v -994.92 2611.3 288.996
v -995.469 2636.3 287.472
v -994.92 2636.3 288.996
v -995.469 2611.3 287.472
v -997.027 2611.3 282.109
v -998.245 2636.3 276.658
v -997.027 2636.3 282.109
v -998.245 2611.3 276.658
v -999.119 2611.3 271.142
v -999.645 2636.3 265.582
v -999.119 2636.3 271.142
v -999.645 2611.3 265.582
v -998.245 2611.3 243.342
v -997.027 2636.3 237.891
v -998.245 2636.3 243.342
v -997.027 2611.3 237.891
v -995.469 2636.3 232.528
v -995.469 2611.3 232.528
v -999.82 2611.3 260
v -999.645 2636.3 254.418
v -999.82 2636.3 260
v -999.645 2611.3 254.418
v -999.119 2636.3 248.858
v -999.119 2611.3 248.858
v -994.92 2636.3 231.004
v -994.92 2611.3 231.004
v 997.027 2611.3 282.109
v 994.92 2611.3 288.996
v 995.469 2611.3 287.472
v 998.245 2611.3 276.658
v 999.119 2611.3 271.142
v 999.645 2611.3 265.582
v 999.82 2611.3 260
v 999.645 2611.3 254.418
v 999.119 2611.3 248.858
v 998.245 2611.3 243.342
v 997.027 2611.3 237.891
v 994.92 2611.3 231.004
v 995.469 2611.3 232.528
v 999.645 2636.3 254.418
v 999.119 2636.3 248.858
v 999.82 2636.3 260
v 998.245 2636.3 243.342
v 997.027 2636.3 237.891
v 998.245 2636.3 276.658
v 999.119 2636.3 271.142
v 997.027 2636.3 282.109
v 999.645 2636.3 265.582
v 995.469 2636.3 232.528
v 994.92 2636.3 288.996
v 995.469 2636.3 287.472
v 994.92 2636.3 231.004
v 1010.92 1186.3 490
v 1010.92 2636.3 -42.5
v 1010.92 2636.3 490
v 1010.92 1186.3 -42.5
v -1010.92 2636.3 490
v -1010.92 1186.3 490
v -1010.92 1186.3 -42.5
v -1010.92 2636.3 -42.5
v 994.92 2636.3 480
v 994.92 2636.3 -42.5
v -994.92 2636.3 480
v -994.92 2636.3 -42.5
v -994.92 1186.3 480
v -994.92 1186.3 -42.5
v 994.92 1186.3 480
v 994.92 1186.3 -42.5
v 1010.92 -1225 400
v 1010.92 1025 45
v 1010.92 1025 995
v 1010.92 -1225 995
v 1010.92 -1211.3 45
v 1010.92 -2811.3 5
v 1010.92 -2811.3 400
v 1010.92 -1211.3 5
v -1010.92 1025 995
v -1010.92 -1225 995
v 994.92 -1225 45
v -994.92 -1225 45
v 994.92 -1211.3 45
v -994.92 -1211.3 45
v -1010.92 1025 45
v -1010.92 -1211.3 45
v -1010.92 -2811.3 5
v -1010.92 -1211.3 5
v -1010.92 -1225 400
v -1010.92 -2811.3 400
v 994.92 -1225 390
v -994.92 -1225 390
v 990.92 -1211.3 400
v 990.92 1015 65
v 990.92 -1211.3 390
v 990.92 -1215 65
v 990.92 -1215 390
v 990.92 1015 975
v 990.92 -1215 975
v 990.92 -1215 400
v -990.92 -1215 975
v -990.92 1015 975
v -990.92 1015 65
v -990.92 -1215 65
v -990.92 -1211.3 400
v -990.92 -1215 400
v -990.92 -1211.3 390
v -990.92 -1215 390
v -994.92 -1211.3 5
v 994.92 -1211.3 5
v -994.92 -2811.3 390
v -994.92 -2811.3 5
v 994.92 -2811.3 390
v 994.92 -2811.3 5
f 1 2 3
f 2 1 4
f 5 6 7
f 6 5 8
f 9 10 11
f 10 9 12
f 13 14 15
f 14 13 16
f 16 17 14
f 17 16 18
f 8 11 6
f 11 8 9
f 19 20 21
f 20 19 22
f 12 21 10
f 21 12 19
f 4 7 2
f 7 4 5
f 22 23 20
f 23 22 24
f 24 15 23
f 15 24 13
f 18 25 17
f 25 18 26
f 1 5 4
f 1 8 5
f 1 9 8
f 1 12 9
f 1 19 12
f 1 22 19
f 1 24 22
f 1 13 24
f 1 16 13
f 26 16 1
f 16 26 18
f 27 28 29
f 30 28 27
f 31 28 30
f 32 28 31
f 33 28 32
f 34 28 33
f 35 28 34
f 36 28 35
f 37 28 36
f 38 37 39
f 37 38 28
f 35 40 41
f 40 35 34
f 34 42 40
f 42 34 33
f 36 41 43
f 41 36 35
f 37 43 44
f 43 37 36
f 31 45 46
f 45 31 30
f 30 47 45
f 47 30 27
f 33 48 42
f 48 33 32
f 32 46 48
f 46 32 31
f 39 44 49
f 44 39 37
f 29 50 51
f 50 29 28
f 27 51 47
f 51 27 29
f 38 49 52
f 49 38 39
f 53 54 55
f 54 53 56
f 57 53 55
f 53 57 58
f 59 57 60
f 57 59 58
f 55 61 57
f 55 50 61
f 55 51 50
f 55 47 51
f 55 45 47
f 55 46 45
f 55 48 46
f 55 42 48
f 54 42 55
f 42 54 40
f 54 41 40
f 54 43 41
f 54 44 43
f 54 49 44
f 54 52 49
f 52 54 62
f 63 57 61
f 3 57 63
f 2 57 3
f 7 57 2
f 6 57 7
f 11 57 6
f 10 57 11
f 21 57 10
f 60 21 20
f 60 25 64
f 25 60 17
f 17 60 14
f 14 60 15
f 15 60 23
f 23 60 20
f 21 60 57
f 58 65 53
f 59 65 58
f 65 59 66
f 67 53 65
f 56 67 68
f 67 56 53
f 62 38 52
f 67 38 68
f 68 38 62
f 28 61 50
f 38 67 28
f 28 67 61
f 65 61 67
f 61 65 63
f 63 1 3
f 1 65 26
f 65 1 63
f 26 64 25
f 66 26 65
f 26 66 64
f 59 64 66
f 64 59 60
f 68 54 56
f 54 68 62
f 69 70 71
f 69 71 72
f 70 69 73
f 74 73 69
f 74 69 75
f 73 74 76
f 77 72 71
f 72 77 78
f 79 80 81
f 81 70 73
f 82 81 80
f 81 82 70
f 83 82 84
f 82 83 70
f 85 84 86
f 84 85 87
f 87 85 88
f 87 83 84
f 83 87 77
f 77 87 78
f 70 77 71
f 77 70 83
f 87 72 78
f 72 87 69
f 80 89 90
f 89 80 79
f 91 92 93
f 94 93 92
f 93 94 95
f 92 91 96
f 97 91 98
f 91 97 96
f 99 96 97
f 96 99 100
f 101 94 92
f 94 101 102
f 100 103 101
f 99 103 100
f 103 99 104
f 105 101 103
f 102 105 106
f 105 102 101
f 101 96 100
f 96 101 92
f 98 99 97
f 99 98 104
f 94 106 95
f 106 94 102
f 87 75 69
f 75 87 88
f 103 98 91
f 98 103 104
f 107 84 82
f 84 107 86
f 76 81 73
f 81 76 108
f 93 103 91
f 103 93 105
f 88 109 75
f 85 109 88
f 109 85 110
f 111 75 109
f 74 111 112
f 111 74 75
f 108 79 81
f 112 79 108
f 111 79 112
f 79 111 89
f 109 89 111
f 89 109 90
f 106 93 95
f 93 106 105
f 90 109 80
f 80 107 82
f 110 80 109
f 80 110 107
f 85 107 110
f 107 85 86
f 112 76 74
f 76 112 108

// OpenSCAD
// ====================================================================================
// REVOLUTIONARY TECHNOLOGY COMPANY & UNIVERSITY OF WASHINGTON DEPARTMENT OF PHYSICS
// Subsystem: impala_ss_4door_body.scad (2027 Impala 4-Door Sedan Stamping Mask)
// Core Application: 1967 B-Body Silhouette Mated to Modern Titanium Architecture
// COMPLIANCE GATE: Maintains absolute 65mm lower open clearance for underbody armor
// Center Origin (0,0,0) = Geometric Centerpoint of the 119-Inch Wheelbase Centerline
// ====================================================================================

$fn = 100; // Parametric panel contour surface finish path resolution

// --- 1967/2027 Impala SS 4-Door Dimensional Constants (mm) ---
inch_to_mm         = 25.4;
impala_wheelbase   = 119.0 * inch_to_mm; // Exactly 3022.60 mm classic tracking length
body_total_width   = 79.6 * inch_to_mm;  // 2021.84 mm wide muscle-car shoulder stance
sheet_metal_thick  = 1.50;               // Heavy fleet-gauge stamped steel skin scale

// Underbody Clearance Rule Compliance
UNDER_ARMOR_CLEARANCE_MM = 65.00;

module stamped_front_hood_and_fenders() {
    echo("STAMPING 2027 IMPALA SS 4-DOOR SEDAN EXTERIOR FLEET MASK");
    // Sweeping front nose clip clearing the 1,350 Nm Square-Tooth propulsion engine core
    color("ClassicTeal") {
        difference() {
            // Front clip exterior boundary envelope
            translate([0, impala_wheelbase/2 + 400, 180])
                cube([body_total_width, 1450, 620], center=true);
            
            // Hollow inner engine bay cavity clearing structural chassis rails
            translate([0, impala_wheelbase/2 + 400, 180])
                cube([body_total_width - 32, 1454, 600], center=true);
                
            // LOWER PROFILE STANDOFF: Cuts base line to leave open armor installation room
            translate([0, impala_wheelbase/2 + 400, -140])
                cube([body_total_width + 10, 1460, UNDER_ARMOR_CLEARANCE_MM * 3], center=true);
                
            // 7-INCH ROUND HEADLIGHT BUCKETS: Dual circular sealed-beam socket cutouts
            for (side = [-1, 1]) {
                for (offset = [-60, 60]) {
                    translate([side * (body_total_width/2 - 160) + offset, impala_wheelbase/2 + 1120, 260])
                        rotate([-90, 0, 0])
                            cylinder(d=177.8, h=40, center=true); // 7.00 inches diameter standard
                }
            }
        }
    }
}

module pillarless_4door_cabin_shell() {
    // Stamped four-door passenger compartment featuring extended rear suicide door glass tracks
    color("DarkSlateGrey") {
        difference() {
            // Main greenhouse roof and side flank block profile
            translate([0, -100, 520])
                cube([body_total_width, 2250, 950], center=true);
            // Hollow interior cabin cockpit cave clearing the OtterBox console skeleton
            translate([0, -100, 520])
                cube([body_total_width - 40, 2230, 910], center=true);
                
            // LOWER ROCKER PANEL ARMOR SEAT OVERRIDE
            translate([0, -100, -30])
                cube([body_total_width + 10, 2260, UNDER_ARMOR_CLEARANCE_MM * 2], center=true);
        }
    }
}

module coke_bottle_rear_quarter_panels() {
    // Stamped rear trunk deck and classic curved "coke-bottle" rear fender hips
    color("ClassicTeal") {
        translate([0, -impala_wheelbase/2 - 500, 140]) {
            difference() {
                cube([body_total_width, 1600, 520], center=true);
                cube([body_total_width - 32, 1604, 500], center=true); // Hollow fuel cell pocket
                
                // Base clearance plane saving the 65mm underbody shield gap
                translate([0, 0, -200])
                    cube([body_total_width + 10, 1610, UNDER_ARMOR_CLEARANCE_MM * 2], center=true);
            }
        }
    }
}

// --- Composite 4-Door Impala Body Instantiation ---
union() {
    stamped_front_hood_and_fenders();
    pillarless_4door_cabin_shell();
    coke_bottle_rear_quarter_panels();
}
